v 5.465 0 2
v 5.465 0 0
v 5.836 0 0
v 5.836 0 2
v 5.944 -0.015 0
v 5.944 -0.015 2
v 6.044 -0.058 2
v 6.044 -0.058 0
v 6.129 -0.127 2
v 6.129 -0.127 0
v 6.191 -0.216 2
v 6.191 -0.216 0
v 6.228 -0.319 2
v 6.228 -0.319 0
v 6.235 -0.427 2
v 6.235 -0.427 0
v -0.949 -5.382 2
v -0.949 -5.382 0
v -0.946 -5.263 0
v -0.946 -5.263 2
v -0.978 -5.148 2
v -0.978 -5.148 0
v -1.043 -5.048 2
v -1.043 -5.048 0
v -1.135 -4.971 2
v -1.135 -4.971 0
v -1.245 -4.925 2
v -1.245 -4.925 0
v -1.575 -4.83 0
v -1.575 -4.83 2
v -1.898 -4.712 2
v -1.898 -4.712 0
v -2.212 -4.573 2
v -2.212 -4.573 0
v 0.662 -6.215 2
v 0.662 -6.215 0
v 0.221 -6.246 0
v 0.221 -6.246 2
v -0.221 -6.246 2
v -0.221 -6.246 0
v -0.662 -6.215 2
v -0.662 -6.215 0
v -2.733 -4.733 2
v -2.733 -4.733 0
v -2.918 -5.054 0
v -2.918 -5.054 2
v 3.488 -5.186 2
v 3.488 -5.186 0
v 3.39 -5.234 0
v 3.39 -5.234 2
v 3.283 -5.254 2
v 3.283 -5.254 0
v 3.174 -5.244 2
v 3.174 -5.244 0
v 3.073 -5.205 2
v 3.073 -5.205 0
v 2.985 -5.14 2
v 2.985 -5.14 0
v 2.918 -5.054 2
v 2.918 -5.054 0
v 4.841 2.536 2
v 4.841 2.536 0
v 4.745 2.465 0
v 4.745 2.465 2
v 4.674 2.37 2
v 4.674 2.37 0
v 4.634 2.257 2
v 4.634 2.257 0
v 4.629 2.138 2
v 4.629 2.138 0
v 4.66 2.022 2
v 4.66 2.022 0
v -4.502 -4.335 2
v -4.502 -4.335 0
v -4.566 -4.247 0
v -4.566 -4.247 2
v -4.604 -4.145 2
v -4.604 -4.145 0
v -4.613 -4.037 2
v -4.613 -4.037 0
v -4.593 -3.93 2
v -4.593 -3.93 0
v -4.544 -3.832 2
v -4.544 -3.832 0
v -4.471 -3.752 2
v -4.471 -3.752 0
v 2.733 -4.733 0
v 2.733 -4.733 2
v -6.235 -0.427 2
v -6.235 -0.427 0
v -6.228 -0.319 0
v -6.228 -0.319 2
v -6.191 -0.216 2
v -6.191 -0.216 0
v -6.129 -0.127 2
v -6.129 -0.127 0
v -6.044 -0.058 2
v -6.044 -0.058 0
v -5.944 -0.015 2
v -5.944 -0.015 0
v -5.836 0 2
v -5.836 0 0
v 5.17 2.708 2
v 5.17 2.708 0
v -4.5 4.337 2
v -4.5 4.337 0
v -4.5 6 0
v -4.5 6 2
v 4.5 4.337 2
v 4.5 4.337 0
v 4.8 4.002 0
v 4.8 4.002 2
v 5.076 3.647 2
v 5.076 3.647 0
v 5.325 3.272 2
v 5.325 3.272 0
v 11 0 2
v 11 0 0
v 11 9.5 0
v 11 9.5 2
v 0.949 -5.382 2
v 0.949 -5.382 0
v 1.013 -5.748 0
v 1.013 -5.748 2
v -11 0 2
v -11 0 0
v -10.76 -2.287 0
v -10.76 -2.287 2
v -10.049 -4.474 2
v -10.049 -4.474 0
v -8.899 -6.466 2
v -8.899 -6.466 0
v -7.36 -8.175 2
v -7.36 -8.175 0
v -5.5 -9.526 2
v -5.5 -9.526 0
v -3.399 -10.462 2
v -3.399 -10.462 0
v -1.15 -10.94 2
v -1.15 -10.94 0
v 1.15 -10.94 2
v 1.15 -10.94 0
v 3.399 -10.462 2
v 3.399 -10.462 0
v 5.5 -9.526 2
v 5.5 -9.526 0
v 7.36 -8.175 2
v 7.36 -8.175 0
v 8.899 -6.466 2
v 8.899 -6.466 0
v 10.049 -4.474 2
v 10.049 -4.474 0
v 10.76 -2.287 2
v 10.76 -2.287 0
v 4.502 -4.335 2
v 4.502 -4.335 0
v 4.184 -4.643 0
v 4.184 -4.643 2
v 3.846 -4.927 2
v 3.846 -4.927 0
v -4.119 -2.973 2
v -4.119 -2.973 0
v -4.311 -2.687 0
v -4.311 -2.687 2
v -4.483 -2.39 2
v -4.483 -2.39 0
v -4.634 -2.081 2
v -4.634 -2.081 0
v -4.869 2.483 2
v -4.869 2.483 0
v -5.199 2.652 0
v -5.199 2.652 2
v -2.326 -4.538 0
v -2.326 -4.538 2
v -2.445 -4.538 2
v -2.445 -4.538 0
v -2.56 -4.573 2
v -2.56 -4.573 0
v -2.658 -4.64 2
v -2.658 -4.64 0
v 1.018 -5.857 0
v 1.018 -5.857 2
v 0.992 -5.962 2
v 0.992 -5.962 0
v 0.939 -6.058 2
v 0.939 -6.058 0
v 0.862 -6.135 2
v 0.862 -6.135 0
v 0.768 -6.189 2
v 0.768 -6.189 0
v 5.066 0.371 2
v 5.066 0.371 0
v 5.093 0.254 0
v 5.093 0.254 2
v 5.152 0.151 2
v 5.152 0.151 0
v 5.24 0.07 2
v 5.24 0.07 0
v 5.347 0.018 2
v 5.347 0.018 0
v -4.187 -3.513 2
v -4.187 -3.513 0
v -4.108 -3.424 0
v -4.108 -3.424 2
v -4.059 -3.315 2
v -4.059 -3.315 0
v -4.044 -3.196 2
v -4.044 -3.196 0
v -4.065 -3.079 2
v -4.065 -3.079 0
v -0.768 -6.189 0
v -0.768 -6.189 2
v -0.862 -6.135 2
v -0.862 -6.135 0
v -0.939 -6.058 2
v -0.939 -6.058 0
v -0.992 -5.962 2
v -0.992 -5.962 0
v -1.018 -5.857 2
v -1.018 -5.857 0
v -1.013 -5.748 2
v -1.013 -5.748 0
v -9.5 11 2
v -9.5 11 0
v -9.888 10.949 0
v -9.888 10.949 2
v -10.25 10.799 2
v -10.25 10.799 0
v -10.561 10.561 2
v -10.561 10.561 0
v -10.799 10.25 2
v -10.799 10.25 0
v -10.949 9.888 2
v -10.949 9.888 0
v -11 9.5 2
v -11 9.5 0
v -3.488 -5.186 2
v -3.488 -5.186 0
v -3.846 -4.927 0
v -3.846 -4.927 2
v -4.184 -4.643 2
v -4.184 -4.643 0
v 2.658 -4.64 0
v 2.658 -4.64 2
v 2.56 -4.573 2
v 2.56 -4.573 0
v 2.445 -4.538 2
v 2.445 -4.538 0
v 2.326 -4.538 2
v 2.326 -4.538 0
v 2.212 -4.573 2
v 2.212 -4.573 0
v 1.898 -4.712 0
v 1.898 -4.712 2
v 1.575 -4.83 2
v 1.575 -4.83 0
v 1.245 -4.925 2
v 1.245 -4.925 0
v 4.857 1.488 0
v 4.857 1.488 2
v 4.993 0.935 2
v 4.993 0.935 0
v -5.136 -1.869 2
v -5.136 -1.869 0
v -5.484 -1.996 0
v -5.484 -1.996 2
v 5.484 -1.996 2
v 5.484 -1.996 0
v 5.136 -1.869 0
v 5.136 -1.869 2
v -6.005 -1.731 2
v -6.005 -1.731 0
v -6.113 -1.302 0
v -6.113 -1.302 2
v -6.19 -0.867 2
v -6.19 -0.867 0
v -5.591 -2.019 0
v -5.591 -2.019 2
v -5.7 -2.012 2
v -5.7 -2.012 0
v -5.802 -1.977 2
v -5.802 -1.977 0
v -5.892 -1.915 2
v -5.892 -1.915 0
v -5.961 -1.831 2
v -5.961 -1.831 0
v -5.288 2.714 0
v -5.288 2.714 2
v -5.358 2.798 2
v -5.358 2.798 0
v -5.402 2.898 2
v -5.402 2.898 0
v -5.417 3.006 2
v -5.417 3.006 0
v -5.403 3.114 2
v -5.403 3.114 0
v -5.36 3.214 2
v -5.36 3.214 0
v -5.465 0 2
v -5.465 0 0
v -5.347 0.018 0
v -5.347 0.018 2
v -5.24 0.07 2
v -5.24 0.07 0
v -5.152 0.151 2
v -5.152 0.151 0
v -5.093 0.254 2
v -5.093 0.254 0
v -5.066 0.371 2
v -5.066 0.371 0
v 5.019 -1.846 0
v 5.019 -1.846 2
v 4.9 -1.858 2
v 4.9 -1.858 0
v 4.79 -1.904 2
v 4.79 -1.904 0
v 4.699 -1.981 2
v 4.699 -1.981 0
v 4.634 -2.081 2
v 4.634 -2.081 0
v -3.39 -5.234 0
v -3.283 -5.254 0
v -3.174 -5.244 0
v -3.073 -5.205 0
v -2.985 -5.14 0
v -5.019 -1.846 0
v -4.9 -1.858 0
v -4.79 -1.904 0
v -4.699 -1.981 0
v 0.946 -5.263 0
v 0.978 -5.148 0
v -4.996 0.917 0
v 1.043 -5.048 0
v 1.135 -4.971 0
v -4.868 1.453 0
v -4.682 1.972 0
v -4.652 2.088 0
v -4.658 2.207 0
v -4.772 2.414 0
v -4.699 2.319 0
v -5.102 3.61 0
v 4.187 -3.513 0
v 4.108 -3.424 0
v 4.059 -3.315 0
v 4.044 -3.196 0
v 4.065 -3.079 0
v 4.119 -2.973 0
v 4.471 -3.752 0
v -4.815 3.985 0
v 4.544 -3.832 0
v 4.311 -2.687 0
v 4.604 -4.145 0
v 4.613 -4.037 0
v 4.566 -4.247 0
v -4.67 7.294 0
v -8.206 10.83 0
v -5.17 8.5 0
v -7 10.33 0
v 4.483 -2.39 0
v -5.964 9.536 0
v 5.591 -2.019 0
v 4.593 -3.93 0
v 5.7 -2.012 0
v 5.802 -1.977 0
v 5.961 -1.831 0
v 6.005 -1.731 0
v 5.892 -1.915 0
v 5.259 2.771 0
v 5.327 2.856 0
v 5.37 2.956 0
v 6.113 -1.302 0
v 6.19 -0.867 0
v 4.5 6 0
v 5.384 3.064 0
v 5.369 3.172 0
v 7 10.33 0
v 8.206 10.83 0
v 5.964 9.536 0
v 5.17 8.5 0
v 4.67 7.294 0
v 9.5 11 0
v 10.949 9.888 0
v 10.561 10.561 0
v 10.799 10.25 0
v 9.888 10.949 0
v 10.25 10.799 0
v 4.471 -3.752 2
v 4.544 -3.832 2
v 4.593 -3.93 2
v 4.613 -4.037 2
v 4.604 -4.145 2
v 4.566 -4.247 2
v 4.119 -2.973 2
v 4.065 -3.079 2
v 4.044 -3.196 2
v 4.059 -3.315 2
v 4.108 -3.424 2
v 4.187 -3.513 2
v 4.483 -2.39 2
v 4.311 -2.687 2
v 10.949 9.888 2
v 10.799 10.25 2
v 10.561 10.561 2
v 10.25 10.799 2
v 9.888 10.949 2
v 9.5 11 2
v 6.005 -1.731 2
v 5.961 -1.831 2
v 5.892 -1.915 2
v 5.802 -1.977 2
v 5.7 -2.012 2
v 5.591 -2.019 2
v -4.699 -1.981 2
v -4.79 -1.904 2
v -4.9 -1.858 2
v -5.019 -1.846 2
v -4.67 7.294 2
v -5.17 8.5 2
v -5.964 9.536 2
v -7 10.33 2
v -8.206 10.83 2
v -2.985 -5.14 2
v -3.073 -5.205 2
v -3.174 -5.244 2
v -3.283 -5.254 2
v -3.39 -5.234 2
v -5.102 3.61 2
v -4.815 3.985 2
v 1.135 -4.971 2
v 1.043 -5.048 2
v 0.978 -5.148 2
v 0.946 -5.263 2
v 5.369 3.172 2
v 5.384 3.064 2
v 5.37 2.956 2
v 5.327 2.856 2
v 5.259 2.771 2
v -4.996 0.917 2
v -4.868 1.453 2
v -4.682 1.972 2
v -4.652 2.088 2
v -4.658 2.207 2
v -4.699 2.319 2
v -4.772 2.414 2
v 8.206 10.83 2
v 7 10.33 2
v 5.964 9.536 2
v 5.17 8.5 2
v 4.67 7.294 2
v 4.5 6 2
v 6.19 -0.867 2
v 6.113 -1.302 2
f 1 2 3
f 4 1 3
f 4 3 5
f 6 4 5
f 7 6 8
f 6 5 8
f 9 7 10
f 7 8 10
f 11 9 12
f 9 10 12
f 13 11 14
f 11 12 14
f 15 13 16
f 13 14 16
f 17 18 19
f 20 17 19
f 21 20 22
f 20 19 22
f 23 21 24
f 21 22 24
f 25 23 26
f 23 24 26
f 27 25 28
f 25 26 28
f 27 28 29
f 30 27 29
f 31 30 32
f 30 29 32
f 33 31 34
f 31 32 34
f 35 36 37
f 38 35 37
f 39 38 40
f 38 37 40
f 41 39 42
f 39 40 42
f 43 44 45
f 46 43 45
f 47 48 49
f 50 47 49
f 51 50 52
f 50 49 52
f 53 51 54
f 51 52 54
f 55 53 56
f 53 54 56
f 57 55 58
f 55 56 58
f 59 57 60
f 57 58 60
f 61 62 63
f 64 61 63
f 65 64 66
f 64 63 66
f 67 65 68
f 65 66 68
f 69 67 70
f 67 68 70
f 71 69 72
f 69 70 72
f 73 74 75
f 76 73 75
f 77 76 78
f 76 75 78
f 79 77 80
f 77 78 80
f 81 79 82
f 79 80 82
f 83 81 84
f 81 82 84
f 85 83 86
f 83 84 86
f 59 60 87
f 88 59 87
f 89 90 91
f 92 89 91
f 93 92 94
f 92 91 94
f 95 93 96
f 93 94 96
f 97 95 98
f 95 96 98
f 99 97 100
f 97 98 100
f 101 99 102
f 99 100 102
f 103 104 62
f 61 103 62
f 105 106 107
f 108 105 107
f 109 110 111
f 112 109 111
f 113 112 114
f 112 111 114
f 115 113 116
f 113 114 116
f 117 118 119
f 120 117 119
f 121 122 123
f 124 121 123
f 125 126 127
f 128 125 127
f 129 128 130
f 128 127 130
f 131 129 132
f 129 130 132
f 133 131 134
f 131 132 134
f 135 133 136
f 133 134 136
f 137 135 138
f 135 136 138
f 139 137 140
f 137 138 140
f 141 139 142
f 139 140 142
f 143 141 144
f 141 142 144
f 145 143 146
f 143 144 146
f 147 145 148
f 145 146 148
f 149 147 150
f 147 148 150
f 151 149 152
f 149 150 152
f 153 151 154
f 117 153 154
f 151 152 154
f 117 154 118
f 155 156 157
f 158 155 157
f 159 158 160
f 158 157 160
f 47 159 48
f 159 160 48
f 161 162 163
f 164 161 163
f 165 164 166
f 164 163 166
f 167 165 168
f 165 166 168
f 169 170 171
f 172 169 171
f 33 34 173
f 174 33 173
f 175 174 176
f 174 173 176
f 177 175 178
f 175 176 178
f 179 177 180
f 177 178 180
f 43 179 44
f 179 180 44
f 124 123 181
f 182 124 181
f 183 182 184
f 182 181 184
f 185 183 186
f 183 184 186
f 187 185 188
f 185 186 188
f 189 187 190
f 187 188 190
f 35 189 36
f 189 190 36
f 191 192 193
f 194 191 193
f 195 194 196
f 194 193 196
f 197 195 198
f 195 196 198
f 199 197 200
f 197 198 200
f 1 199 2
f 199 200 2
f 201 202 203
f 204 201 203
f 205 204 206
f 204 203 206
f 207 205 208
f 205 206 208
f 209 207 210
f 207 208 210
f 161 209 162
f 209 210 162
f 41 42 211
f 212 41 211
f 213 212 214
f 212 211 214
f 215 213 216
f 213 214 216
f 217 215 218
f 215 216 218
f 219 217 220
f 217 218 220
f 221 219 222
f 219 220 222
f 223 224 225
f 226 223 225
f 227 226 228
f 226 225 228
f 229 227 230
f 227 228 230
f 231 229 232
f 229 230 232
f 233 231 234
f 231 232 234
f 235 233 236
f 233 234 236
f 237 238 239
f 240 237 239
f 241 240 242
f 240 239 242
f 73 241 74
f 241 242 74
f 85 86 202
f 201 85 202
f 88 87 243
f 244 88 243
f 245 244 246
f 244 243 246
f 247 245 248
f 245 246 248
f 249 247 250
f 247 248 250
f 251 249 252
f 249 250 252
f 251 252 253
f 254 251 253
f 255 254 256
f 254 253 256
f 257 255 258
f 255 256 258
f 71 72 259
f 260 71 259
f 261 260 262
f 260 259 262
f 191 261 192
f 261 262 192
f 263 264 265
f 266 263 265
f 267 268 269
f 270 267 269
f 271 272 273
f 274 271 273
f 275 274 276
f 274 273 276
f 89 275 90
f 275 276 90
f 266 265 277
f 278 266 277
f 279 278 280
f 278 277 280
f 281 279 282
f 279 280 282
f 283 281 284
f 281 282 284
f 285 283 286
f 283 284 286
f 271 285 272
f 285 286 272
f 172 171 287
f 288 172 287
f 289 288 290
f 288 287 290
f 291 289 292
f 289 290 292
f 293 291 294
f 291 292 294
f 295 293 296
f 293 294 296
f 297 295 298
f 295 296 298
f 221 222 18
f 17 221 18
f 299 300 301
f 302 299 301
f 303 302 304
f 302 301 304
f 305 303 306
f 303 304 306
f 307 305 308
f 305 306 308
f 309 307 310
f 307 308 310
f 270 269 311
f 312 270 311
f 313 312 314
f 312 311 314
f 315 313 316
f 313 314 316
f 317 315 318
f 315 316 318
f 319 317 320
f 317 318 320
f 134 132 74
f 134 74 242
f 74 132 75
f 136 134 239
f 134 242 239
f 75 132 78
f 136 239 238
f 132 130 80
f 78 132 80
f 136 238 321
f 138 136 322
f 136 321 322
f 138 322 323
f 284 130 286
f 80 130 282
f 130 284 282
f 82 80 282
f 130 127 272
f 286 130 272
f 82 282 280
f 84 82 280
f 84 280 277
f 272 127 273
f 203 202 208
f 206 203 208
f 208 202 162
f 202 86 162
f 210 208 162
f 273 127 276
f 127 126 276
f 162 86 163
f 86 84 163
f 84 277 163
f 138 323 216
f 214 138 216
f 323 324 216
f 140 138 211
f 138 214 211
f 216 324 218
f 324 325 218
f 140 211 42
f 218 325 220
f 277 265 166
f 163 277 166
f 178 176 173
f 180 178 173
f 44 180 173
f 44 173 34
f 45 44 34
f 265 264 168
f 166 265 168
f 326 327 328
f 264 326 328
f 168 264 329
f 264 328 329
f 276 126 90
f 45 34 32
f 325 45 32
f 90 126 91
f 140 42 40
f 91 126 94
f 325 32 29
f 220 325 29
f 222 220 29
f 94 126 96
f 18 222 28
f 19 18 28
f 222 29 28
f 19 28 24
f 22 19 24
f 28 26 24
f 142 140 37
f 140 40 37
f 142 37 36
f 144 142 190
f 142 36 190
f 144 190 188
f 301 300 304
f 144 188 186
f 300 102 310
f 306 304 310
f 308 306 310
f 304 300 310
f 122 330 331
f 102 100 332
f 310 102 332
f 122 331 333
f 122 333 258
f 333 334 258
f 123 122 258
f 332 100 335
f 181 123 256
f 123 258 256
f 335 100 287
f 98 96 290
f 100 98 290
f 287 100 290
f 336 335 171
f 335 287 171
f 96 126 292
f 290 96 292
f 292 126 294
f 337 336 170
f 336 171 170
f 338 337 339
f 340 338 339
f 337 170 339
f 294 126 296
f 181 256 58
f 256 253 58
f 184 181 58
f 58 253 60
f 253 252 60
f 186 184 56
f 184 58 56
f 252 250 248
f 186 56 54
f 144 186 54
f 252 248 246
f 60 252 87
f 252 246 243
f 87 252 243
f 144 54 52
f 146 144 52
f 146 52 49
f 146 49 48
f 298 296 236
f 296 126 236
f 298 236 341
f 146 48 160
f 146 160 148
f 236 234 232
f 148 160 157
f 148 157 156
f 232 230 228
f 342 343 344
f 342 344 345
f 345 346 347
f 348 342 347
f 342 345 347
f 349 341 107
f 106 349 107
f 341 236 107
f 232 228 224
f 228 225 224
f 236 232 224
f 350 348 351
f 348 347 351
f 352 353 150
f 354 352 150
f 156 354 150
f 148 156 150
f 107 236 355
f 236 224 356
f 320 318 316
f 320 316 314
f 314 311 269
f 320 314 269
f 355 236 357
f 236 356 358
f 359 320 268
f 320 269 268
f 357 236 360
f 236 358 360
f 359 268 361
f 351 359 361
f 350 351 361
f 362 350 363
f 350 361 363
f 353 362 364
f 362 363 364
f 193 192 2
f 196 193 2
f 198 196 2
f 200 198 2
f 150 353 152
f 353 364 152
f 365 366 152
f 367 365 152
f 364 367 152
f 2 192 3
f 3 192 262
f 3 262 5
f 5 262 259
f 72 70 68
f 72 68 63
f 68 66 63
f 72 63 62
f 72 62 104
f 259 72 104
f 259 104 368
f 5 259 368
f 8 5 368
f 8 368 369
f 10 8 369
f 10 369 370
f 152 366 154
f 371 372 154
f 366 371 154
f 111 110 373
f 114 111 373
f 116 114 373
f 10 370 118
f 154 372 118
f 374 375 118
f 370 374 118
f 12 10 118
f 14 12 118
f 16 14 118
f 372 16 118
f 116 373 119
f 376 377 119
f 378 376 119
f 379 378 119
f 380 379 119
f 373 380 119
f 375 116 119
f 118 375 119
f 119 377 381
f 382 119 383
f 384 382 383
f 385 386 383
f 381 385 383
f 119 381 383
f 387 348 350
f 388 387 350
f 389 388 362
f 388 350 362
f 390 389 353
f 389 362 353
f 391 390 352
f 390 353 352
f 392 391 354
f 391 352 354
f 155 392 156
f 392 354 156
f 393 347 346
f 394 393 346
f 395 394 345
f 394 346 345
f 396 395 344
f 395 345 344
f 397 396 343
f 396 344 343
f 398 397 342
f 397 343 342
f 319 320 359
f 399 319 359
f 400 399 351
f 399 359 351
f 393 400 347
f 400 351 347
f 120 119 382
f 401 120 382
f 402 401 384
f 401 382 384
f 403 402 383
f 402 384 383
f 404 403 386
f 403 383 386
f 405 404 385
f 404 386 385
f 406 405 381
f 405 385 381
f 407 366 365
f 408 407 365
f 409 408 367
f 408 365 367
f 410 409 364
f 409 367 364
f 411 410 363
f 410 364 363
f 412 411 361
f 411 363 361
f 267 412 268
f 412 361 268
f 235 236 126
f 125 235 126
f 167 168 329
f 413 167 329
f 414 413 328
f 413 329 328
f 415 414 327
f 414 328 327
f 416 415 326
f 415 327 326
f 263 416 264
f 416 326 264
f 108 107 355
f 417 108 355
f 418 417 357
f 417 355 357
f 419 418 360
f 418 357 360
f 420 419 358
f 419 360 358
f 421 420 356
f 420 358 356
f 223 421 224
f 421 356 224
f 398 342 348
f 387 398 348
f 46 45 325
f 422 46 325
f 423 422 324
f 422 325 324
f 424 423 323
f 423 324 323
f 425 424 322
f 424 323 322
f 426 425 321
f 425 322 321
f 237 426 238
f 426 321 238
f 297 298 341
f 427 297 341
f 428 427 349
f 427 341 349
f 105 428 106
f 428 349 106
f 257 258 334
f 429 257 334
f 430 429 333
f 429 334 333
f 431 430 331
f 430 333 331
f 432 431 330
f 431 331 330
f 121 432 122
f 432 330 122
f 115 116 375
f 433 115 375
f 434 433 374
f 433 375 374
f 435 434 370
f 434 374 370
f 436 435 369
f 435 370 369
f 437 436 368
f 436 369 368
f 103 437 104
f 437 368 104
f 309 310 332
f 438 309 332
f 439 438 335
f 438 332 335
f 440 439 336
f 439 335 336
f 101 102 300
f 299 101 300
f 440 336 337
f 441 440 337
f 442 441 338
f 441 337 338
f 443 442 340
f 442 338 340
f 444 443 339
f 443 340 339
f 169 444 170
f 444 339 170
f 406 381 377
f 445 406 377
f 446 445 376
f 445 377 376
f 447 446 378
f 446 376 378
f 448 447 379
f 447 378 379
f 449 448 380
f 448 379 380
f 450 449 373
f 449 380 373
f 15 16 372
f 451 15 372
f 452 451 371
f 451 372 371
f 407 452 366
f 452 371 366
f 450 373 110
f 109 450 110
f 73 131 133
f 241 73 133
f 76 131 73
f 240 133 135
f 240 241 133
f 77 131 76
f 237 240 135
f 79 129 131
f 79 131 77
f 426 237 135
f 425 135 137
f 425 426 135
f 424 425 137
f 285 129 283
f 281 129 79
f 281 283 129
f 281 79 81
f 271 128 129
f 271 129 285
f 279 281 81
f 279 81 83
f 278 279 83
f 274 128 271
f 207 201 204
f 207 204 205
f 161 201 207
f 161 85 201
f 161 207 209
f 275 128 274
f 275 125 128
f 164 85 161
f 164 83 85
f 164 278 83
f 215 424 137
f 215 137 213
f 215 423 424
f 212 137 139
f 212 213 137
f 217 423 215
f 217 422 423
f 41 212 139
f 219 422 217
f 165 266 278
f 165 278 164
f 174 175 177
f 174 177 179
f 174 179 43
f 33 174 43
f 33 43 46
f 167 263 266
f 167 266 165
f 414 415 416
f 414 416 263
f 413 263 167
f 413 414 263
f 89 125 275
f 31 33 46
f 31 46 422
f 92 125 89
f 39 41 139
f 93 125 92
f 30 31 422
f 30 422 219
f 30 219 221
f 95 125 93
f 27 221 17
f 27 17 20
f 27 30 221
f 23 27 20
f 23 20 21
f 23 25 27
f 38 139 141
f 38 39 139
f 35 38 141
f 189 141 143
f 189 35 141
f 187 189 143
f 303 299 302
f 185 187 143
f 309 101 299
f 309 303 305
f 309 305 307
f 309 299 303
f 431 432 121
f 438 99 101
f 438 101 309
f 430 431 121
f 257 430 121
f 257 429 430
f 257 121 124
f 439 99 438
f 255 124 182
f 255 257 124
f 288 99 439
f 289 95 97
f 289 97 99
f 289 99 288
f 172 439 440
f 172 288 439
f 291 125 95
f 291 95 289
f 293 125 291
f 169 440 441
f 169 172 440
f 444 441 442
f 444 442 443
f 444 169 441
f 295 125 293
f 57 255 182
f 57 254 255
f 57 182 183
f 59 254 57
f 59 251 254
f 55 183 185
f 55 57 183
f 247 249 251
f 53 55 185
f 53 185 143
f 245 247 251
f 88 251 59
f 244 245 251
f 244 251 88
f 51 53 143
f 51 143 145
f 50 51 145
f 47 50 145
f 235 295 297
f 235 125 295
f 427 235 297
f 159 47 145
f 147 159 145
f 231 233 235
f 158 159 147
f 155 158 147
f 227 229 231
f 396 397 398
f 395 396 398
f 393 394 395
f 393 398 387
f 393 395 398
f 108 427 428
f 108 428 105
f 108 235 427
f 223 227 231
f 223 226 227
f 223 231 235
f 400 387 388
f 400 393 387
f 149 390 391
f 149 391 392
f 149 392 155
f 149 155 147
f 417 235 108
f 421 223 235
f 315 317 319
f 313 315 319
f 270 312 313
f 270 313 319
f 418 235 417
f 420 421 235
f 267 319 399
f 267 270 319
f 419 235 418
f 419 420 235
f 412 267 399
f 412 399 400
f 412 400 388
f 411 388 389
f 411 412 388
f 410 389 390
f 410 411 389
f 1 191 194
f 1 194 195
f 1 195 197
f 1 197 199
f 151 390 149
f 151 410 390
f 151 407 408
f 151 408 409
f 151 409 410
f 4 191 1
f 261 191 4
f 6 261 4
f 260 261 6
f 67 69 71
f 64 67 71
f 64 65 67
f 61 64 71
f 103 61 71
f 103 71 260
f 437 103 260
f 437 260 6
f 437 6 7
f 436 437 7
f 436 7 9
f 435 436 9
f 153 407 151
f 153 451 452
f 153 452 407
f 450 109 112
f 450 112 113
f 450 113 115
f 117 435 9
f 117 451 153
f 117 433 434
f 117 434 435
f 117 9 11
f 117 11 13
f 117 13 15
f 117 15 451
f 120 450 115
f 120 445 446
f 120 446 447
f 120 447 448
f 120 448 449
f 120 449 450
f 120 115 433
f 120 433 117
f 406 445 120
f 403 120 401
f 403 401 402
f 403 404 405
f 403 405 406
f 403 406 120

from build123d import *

# Parameters (mm, degrees)
F1_DEPTH = 2


with BuildPart() as f1:
    # F0 (on Top) → F1 (new body)
    with BuildSketch(Plane.XY):
        with BuildLine():
            ThreePointArc((-5.066449, 0.370803), (-4.939368, 1.187032), (-4.681679, 1.971873))
            ThreePointArc((-4.681679, 1.971873), (-4.674597, 2.264385), (-4.868556, 2.483458))
            Line((-4.868556, 2.483458), (-5.198977, 2.652007))
            ThreePointArc((-5.198977, 2.652007), (-5.401697, 2.897981), (-5.360275, 3.214024))
            ThreePointArc((-5.360275, 3.214024), (-4.962027, 3.800103), (-4.5, 4.337338))
            Line((-4.5, 4.337338), (-4.5, 6))
            ThreePointArc((-4.5, 6), (-5.964466, 9.535534), (-9.5, 11))
            ThreePointArc((-9.5, 11), (-10.56066, 10.56066), (-11, 9.5))
            Line((-11, 9.5), (-11, 0))
            ThreePointArc((-11, 0), (0, -11), (11, 0))
            Line((11, 0), (11, 9.5))
            ThreePointArc((11, 9.5), (10.56066, 10.56066), (9.5, 11))
            ThreePointArc((9.5, 11), (5.964466, 9.535534), (4.5, 6))
            Line((4.5, 6), (4.5, 4.337338))
            ThreePointArc((4.5, 4.337338), (4.941382, 3.82691), (5.325163, 3.271872))
            ThreePointArc((5.325163, 3.271872), (5.370003, 2.956296), (5.169959, 2.708141))
            Line((5.169959, 2.708141), (4.841382, 2.536025))
            ThreePointArc((4.841382, 2.536025), (4.649807, 2.314864), (4.660055, 2.022447))
            ThreePointArc((4.660055, 2.022447), (4.932869, 1.213755), (5.066449, 0.370803))
            ThreePointArc((5.066449, 0.370803), (5.193058, 0.107016), (5.465382, 0))
            Line((5.465382, 0), (5.836309, 0))
            ThreePointArc((5.836309, 0), (6.128661, -0.126998), (6.235373, -0.42735))
            ThreePointArc((6.235373, -0.42735), (6.155048, -1.085301), (6.005496, -1.731045))
            ThreePointArc((6.005496, -1.731045), (5.802494, -1.976786), (5.484336, -1.996135))
            Line((5.484336, -1.996135), (5.135779, -1.869271))
            ThreePointArc((5.135779, -1.869271), (4.843276, -1.876693), (4.634083, -2.081268))
            ThreePointArc((4.634083, -2.081268), (4.399409, -2.54), (4.119473, -2.972599))
            ThreePointArc((4.119473, -2.972599), (4.046902, -3.256054), (4.186725, -3.51308))
            Line((4.186725, -3.51308), (4.470872, -3.751507))
            ThreePointArc((4.470872, -3.751507), (4.613194, -4.036714), (4.501877, -4.33539))
            ThreePointArc((4.501877, -4.33539), (4.017423, -4.787778), (3.487783, -5.186316))
            ThreePointArc((3.487783, -5.186316), (3.174314, -5.244077), (2.918154, -5.054392))
            Line((2.918154, -5.054392), (2.732691, -4.73316))
            ThreePointArc((2.732691, -4.73316), (2.50385, -4.550828), (2.2121, -4.573075))
            ThreePointArc((2.2121, -4.573075), (1.737462, -4.773639), (1.244949, -4.925089))
            ThreePointArc((1.244949, -4.925089), (1.007156, -5.09558), (0.949054, -5.382351))
            Line((0.949054, -5.382351), (1.013464, -5.747642))
            ThreePointArc((1.013464, -5.747642), (0.939162, -6.057606), (0.661903, -6.214852))
            ThreePointArc((0.661903, -6.214852), (0, -6.25), (-0.661903, -6.214852))
            ThreePointArc((-0.661903, -6.214852), (-0.939162, -6.057606), (-1.013464, -5.747642))
            Line((-1.013464, -5.747642), (-0.949054, -5.382351))
            ThreePointArc((-0.949054, -5.382351), (-1.007156, -5.09558), (-1.244949, -4.925089))
            ThreePointArc((-1.244949, -4.925089), (-1.737462, -4.773639), (-2.2121, -4.573075))
            ThreePointArc((-2.2121, -4.573075), (-2.50385, -4.550828), (-2.732691, -4.73316))
            Line((-2.732691, -4.73316), (-2.918154, -5.054392))
            ThreePointArc((-2.918154, -5.054392), (-3.174314, -5.244077), (-3.487783, -5.186316))
            ThreePointArc((-3.487783, -5.186316), (-4.017423, -4.787778), (-4.501877, -4.33539))
            ThreePointArc((-4.501877, -4.33539), (-4.613194, -4.036714), (-4.470872, -3.751507))
            Line((-4.470872, -3.751507), (-4.186725, -3.51308))
            ThreePointArc((-4.186725, -3.51308), (-4.046902, -3.256054), (-4.119473, -2.972599))
            ThreePointArc((-4.119473, -2.972599), (-4.399409, -2.54), (-4.634083, -2.081268))
            ThreePointArc((-4.634083, -2.081268), (-4.843276, -1.876693), (-5.135779, -1.869271))
            Line((-5.135779, -1.869271), (-5.484336, -1.996135))
            ThreePointArc((-5.484336, -1.996135), (-5.802494, -1.976786), (-6.005496, -1.731045))
            ThreePointArc((-6.005496, -1.731045), (-6.155048, -1.085301), (-6.235373, -0.42735))
            ThreePointArc((-6.235373, -0.42735), (-6.128661, -0.126998), (-5.836309, 0))
            Line((-5.836309, 0), (-5.465382, 0))
            ThreePointArc((-5.465382, 0), (-5.193058, 0.107016), (-5.066449, 0.370803))
        make_face()
    extrude(amount=F1_DEPTH)


solid = f1.part
